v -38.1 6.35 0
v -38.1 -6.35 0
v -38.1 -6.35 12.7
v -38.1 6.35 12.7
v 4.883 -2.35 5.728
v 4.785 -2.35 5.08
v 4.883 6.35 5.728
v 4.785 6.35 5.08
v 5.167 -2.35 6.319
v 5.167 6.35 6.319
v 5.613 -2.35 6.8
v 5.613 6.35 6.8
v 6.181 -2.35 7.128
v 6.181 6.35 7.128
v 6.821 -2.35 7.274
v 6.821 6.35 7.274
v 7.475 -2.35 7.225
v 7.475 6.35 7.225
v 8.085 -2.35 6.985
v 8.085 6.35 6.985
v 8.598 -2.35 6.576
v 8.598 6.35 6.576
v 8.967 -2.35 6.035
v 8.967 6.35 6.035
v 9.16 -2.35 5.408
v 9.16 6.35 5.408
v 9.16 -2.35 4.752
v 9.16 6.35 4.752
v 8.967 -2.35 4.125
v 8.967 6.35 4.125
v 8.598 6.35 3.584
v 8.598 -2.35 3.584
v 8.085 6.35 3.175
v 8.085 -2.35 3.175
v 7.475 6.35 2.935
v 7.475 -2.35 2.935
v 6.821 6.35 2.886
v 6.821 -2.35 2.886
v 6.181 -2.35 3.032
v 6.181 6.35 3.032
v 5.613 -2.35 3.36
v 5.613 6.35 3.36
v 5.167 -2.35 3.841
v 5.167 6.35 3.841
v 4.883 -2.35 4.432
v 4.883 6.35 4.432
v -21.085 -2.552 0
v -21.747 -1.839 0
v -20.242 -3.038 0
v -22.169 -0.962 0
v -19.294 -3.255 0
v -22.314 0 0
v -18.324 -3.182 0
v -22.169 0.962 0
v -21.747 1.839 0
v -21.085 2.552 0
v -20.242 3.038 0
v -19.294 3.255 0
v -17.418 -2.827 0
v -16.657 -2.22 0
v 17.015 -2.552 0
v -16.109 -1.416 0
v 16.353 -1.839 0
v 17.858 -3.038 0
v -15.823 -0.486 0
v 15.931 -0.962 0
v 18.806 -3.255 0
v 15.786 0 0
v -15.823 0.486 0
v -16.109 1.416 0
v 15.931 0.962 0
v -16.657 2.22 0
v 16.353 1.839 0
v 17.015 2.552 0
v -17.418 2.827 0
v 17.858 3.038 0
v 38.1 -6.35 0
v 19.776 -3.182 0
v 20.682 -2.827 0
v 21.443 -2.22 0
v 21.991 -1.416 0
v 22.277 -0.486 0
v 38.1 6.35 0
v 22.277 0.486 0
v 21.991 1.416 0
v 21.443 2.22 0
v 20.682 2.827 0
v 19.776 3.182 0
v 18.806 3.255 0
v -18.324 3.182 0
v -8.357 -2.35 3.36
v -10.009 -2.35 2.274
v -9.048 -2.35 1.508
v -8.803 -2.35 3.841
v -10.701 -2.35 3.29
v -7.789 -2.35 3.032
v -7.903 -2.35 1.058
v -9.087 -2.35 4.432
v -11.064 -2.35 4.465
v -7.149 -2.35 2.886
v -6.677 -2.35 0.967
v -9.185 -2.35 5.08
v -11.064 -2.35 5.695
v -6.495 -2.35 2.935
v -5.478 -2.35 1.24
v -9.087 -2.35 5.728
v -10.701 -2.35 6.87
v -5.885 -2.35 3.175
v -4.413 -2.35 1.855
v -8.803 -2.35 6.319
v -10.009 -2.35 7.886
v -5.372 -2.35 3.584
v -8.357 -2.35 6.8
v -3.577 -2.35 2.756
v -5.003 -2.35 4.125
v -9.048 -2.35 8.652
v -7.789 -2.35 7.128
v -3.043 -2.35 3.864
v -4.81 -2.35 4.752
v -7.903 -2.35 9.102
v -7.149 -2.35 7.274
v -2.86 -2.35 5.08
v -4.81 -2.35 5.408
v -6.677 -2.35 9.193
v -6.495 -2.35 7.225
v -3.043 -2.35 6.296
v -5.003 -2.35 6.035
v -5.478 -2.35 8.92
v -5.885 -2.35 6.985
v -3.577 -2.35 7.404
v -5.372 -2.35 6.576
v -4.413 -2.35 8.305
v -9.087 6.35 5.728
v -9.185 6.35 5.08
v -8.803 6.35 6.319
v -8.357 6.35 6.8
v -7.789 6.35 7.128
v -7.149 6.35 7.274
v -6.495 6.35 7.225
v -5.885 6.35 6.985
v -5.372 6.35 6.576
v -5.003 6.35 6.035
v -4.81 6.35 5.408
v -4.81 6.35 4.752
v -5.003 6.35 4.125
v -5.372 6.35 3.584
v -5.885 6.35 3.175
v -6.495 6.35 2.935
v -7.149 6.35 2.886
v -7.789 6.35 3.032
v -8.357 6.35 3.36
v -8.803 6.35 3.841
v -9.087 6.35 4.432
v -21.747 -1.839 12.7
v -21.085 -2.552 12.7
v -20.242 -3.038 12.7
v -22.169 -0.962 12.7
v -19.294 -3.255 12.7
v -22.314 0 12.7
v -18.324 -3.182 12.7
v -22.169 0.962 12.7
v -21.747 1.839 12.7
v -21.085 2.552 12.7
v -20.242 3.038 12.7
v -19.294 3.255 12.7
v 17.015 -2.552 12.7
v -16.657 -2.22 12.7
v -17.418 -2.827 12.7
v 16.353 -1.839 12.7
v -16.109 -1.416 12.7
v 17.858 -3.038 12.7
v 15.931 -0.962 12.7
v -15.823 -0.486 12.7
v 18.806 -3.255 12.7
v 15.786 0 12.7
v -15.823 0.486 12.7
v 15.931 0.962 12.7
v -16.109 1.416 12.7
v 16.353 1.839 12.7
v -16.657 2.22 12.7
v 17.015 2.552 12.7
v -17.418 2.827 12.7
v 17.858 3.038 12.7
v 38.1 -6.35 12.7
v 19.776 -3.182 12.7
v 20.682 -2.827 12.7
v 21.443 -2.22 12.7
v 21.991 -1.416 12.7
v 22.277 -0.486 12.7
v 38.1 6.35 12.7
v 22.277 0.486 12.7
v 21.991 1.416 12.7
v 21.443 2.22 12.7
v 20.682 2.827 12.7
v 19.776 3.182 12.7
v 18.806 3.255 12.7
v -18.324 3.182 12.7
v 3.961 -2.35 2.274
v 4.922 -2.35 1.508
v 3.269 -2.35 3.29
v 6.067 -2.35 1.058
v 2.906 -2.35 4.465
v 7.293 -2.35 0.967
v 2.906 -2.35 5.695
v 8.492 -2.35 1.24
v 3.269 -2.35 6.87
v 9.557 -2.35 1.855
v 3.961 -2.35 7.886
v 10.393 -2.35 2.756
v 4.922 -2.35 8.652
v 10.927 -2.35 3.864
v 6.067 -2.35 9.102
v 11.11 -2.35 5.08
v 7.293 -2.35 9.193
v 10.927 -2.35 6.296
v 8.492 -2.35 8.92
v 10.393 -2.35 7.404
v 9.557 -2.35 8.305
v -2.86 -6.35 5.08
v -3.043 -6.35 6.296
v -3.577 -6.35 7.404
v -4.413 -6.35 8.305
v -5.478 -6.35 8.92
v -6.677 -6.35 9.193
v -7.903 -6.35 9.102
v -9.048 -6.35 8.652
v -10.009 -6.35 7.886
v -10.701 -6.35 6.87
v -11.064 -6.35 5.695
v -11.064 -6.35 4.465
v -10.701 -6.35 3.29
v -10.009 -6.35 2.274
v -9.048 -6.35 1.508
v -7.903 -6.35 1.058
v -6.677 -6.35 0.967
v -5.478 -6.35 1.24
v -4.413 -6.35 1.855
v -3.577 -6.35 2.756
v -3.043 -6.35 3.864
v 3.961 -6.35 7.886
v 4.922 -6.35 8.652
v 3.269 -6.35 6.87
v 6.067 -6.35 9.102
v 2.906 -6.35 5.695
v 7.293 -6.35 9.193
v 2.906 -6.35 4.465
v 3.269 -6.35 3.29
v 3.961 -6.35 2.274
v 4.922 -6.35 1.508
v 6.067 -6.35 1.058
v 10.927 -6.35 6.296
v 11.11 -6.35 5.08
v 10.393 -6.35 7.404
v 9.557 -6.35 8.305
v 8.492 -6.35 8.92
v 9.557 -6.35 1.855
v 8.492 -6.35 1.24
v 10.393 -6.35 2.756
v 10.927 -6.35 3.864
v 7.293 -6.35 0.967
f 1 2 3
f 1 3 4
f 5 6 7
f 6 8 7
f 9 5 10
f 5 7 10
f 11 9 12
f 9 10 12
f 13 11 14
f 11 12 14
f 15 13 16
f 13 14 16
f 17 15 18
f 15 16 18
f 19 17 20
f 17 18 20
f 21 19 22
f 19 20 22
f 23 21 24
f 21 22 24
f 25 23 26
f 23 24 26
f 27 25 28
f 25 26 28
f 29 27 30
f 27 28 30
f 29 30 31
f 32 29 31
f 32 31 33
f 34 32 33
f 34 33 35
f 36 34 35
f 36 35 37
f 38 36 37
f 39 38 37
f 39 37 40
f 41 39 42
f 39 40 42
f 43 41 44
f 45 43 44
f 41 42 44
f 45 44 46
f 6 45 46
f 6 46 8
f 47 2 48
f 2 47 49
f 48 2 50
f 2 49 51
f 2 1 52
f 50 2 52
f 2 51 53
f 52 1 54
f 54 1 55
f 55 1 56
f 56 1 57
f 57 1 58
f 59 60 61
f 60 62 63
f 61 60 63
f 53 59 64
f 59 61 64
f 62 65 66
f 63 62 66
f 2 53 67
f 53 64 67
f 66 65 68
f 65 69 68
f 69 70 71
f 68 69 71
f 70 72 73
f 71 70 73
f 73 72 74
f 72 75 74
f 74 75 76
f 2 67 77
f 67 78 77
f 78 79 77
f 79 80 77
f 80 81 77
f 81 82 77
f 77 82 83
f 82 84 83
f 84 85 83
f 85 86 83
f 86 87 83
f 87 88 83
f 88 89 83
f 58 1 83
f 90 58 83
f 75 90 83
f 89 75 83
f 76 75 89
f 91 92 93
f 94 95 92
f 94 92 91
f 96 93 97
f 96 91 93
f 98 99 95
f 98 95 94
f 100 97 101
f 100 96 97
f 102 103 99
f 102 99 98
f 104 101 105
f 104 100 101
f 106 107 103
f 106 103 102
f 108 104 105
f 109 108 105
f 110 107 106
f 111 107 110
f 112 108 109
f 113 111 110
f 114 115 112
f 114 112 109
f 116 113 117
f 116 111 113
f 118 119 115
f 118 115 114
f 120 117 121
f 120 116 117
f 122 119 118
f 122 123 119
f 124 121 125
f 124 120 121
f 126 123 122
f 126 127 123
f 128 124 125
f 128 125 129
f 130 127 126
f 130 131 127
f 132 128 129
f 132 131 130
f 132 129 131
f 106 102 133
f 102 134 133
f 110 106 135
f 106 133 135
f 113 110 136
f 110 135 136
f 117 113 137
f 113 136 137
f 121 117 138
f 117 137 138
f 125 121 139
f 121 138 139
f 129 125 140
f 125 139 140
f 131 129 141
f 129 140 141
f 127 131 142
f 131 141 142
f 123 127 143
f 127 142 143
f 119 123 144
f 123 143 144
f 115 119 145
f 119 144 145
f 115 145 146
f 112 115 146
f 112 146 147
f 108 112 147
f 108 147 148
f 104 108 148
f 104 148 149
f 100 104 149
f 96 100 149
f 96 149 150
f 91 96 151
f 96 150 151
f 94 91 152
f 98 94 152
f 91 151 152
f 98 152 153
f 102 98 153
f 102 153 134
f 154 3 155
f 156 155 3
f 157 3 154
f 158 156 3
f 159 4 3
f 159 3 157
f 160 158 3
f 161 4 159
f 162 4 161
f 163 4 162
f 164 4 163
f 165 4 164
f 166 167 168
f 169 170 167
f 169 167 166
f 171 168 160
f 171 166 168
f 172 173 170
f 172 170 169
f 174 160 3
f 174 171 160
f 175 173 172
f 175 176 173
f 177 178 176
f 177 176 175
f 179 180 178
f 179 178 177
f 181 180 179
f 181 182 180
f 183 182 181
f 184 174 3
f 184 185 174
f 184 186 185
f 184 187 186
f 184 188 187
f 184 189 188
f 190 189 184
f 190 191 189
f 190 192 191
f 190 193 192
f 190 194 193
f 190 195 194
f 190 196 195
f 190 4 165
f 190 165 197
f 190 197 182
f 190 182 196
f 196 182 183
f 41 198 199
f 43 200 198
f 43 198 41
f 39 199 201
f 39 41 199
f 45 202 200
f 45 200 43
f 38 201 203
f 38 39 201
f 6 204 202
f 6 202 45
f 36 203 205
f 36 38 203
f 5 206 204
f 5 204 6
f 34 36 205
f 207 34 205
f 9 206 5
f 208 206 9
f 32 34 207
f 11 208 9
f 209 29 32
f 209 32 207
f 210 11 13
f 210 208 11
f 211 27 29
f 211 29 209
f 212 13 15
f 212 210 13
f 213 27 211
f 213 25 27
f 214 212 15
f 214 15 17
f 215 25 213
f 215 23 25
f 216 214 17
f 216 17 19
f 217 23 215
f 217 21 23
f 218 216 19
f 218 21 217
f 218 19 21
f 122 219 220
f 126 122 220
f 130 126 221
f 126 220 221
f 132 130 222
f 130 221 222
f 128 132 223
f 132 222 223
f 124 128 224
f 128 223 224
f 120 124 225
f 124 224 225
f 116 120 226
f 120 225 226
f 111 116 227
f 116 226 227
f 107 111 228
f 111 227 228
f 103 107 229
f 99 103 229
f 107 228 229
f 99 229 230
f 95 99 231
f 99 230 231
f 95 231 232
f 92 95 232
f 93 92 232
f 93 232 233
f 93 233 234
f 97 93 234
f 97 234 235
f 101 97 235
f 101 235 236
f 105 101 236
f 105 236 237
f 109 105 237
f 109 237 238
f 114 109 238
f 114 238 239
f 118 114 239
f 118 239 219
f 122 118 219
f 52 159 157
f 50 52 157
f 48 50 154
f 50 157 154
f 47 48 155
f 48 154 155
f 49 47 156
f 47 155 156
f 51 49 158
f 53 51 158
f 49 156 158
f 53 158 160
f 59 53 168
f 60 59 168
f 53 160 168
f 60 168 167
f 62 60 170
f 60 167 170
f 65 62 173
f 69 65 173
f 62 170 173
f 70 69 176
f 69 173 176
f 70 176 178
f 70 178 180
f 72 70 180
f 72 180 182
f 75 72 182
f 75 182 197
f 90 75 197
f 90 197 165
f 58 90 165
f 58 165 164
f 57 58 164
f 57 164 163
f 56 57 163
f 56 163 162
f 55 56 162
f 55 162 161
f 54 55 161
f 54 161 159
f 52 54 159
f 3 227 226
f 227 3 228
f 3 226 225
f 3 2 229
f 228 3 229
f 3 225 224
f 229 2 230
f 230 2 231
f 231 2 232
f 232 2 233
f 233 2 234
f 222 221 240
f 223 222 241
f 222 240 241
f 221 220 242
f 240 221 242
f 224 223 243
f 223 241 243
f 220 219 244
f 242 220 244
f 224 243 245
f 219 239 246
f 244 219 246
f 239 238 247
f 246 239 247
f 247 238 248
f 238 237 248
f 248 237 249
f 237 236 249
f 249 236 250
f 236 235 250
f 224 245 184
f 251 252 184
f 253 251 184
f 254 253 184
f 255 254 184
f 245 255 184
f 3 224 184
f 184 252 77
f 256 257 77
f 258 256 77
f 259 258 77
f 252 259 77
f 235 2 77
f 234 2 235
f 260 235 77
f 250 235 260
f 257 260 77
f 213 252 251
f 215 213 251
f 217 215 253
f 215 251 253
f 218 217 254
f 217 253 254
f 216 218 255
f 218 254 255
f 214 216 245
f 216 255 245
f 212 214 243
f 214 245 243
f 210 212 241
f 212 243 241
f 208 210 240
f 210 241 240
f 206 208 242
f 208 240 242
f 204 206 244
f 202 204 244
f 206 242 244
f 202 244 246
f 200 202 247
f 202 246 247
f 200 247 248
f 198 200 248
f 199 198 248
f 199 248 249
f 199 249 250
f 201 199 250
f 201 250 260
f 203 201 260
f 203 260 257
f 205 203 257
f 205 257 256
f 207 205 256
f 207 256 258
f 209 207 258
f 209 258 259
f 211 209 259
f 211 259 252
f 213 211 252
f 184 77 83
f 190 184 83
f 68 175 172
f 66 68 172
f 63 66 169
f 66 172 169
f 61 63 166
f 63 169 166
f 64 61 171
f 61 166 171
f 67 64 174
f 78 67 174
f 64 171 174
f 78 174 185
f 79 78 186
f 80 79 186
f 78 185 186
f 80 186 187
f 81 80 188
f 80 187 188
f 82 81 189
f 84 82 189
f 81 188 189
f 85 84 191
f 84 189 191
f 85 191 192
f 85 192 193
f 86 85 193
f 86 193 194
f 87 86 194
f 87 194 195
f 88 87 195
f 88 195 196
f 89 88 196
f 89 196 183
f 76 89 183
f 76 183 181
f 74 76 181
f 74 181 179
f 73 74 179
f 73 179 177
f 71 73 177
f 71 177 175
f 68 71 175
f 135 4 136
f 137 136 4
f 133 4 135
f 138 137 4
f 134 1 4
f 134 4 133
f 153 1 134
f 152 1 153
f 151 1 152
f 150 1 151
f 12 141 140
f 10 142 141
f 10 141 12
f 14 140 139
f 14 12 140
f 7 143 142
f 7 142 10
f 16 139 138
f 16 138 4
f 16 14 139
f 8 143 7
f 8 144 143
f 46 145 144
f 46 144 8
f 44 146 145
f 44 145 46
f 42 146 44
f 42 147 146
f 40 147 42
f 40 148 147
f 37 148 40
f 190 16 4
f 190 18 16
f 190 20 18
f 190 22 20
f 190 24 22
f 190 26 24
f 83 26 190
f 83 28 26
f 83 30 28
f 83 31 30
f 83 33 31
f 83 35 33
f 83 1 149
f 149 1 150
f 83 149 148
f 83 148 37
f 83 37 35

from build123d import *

# Parameters (mm, degrees)
F0_W           = 76.2
F0_H           = 12.7
F1_DEPTH       = 12.7
F2_D           = 6.5278
F3_D           = 6.5278
F5_D           = 4.4
F5_CBORE_D     = 8.25
F5_CBORE_DEPTH = 4
F6_D           = 4.4
F6_CBORE_D     = 8.25
F6_CBORE_DEPTH = 4


with BuildPart() as f1:
    # F0 (on Top) → F1 (new body)
    with BuildSketch(Plane.XY):
        Rectangle(F0_W, F0_H)
    extrude(amount=F1_DEPTH)

    # F2 (through all)
    with Locations(Plane(origin=(0, 0, 0), x_dir=(1, 0, 0), z_dir=(0, 0, -1))):
        with Locations((-19.05, 0)):
            Hole(F2_D / 2)

    # F3 (through all)
    with Locations(Plane(origin=(0, 0, 0), x_dir=(1, 0, 0), z_dir=(0, 0, -1))):
        with Locations((19.05, 0)):
            Hole(F3_D / 2)

    # F5 (through all)
    with Locations(Plane.XZ.offset(6.35)):
        with Locations((-6.985, 5.08)):
            CounterBoreHole(F5_D / 2, F5_CBORE_D / 2, F5_CBORE_DEPTH)

    # F6 (through all)
    with Locations(Plane.XZ.offset(6.35)):
        with Locations((6.985, 5.08)):
            CounterBoreHole(F6_D / 2, F6_CBORE_D / 2, F6_CBORE_DEPTH)


solid = f1.part
